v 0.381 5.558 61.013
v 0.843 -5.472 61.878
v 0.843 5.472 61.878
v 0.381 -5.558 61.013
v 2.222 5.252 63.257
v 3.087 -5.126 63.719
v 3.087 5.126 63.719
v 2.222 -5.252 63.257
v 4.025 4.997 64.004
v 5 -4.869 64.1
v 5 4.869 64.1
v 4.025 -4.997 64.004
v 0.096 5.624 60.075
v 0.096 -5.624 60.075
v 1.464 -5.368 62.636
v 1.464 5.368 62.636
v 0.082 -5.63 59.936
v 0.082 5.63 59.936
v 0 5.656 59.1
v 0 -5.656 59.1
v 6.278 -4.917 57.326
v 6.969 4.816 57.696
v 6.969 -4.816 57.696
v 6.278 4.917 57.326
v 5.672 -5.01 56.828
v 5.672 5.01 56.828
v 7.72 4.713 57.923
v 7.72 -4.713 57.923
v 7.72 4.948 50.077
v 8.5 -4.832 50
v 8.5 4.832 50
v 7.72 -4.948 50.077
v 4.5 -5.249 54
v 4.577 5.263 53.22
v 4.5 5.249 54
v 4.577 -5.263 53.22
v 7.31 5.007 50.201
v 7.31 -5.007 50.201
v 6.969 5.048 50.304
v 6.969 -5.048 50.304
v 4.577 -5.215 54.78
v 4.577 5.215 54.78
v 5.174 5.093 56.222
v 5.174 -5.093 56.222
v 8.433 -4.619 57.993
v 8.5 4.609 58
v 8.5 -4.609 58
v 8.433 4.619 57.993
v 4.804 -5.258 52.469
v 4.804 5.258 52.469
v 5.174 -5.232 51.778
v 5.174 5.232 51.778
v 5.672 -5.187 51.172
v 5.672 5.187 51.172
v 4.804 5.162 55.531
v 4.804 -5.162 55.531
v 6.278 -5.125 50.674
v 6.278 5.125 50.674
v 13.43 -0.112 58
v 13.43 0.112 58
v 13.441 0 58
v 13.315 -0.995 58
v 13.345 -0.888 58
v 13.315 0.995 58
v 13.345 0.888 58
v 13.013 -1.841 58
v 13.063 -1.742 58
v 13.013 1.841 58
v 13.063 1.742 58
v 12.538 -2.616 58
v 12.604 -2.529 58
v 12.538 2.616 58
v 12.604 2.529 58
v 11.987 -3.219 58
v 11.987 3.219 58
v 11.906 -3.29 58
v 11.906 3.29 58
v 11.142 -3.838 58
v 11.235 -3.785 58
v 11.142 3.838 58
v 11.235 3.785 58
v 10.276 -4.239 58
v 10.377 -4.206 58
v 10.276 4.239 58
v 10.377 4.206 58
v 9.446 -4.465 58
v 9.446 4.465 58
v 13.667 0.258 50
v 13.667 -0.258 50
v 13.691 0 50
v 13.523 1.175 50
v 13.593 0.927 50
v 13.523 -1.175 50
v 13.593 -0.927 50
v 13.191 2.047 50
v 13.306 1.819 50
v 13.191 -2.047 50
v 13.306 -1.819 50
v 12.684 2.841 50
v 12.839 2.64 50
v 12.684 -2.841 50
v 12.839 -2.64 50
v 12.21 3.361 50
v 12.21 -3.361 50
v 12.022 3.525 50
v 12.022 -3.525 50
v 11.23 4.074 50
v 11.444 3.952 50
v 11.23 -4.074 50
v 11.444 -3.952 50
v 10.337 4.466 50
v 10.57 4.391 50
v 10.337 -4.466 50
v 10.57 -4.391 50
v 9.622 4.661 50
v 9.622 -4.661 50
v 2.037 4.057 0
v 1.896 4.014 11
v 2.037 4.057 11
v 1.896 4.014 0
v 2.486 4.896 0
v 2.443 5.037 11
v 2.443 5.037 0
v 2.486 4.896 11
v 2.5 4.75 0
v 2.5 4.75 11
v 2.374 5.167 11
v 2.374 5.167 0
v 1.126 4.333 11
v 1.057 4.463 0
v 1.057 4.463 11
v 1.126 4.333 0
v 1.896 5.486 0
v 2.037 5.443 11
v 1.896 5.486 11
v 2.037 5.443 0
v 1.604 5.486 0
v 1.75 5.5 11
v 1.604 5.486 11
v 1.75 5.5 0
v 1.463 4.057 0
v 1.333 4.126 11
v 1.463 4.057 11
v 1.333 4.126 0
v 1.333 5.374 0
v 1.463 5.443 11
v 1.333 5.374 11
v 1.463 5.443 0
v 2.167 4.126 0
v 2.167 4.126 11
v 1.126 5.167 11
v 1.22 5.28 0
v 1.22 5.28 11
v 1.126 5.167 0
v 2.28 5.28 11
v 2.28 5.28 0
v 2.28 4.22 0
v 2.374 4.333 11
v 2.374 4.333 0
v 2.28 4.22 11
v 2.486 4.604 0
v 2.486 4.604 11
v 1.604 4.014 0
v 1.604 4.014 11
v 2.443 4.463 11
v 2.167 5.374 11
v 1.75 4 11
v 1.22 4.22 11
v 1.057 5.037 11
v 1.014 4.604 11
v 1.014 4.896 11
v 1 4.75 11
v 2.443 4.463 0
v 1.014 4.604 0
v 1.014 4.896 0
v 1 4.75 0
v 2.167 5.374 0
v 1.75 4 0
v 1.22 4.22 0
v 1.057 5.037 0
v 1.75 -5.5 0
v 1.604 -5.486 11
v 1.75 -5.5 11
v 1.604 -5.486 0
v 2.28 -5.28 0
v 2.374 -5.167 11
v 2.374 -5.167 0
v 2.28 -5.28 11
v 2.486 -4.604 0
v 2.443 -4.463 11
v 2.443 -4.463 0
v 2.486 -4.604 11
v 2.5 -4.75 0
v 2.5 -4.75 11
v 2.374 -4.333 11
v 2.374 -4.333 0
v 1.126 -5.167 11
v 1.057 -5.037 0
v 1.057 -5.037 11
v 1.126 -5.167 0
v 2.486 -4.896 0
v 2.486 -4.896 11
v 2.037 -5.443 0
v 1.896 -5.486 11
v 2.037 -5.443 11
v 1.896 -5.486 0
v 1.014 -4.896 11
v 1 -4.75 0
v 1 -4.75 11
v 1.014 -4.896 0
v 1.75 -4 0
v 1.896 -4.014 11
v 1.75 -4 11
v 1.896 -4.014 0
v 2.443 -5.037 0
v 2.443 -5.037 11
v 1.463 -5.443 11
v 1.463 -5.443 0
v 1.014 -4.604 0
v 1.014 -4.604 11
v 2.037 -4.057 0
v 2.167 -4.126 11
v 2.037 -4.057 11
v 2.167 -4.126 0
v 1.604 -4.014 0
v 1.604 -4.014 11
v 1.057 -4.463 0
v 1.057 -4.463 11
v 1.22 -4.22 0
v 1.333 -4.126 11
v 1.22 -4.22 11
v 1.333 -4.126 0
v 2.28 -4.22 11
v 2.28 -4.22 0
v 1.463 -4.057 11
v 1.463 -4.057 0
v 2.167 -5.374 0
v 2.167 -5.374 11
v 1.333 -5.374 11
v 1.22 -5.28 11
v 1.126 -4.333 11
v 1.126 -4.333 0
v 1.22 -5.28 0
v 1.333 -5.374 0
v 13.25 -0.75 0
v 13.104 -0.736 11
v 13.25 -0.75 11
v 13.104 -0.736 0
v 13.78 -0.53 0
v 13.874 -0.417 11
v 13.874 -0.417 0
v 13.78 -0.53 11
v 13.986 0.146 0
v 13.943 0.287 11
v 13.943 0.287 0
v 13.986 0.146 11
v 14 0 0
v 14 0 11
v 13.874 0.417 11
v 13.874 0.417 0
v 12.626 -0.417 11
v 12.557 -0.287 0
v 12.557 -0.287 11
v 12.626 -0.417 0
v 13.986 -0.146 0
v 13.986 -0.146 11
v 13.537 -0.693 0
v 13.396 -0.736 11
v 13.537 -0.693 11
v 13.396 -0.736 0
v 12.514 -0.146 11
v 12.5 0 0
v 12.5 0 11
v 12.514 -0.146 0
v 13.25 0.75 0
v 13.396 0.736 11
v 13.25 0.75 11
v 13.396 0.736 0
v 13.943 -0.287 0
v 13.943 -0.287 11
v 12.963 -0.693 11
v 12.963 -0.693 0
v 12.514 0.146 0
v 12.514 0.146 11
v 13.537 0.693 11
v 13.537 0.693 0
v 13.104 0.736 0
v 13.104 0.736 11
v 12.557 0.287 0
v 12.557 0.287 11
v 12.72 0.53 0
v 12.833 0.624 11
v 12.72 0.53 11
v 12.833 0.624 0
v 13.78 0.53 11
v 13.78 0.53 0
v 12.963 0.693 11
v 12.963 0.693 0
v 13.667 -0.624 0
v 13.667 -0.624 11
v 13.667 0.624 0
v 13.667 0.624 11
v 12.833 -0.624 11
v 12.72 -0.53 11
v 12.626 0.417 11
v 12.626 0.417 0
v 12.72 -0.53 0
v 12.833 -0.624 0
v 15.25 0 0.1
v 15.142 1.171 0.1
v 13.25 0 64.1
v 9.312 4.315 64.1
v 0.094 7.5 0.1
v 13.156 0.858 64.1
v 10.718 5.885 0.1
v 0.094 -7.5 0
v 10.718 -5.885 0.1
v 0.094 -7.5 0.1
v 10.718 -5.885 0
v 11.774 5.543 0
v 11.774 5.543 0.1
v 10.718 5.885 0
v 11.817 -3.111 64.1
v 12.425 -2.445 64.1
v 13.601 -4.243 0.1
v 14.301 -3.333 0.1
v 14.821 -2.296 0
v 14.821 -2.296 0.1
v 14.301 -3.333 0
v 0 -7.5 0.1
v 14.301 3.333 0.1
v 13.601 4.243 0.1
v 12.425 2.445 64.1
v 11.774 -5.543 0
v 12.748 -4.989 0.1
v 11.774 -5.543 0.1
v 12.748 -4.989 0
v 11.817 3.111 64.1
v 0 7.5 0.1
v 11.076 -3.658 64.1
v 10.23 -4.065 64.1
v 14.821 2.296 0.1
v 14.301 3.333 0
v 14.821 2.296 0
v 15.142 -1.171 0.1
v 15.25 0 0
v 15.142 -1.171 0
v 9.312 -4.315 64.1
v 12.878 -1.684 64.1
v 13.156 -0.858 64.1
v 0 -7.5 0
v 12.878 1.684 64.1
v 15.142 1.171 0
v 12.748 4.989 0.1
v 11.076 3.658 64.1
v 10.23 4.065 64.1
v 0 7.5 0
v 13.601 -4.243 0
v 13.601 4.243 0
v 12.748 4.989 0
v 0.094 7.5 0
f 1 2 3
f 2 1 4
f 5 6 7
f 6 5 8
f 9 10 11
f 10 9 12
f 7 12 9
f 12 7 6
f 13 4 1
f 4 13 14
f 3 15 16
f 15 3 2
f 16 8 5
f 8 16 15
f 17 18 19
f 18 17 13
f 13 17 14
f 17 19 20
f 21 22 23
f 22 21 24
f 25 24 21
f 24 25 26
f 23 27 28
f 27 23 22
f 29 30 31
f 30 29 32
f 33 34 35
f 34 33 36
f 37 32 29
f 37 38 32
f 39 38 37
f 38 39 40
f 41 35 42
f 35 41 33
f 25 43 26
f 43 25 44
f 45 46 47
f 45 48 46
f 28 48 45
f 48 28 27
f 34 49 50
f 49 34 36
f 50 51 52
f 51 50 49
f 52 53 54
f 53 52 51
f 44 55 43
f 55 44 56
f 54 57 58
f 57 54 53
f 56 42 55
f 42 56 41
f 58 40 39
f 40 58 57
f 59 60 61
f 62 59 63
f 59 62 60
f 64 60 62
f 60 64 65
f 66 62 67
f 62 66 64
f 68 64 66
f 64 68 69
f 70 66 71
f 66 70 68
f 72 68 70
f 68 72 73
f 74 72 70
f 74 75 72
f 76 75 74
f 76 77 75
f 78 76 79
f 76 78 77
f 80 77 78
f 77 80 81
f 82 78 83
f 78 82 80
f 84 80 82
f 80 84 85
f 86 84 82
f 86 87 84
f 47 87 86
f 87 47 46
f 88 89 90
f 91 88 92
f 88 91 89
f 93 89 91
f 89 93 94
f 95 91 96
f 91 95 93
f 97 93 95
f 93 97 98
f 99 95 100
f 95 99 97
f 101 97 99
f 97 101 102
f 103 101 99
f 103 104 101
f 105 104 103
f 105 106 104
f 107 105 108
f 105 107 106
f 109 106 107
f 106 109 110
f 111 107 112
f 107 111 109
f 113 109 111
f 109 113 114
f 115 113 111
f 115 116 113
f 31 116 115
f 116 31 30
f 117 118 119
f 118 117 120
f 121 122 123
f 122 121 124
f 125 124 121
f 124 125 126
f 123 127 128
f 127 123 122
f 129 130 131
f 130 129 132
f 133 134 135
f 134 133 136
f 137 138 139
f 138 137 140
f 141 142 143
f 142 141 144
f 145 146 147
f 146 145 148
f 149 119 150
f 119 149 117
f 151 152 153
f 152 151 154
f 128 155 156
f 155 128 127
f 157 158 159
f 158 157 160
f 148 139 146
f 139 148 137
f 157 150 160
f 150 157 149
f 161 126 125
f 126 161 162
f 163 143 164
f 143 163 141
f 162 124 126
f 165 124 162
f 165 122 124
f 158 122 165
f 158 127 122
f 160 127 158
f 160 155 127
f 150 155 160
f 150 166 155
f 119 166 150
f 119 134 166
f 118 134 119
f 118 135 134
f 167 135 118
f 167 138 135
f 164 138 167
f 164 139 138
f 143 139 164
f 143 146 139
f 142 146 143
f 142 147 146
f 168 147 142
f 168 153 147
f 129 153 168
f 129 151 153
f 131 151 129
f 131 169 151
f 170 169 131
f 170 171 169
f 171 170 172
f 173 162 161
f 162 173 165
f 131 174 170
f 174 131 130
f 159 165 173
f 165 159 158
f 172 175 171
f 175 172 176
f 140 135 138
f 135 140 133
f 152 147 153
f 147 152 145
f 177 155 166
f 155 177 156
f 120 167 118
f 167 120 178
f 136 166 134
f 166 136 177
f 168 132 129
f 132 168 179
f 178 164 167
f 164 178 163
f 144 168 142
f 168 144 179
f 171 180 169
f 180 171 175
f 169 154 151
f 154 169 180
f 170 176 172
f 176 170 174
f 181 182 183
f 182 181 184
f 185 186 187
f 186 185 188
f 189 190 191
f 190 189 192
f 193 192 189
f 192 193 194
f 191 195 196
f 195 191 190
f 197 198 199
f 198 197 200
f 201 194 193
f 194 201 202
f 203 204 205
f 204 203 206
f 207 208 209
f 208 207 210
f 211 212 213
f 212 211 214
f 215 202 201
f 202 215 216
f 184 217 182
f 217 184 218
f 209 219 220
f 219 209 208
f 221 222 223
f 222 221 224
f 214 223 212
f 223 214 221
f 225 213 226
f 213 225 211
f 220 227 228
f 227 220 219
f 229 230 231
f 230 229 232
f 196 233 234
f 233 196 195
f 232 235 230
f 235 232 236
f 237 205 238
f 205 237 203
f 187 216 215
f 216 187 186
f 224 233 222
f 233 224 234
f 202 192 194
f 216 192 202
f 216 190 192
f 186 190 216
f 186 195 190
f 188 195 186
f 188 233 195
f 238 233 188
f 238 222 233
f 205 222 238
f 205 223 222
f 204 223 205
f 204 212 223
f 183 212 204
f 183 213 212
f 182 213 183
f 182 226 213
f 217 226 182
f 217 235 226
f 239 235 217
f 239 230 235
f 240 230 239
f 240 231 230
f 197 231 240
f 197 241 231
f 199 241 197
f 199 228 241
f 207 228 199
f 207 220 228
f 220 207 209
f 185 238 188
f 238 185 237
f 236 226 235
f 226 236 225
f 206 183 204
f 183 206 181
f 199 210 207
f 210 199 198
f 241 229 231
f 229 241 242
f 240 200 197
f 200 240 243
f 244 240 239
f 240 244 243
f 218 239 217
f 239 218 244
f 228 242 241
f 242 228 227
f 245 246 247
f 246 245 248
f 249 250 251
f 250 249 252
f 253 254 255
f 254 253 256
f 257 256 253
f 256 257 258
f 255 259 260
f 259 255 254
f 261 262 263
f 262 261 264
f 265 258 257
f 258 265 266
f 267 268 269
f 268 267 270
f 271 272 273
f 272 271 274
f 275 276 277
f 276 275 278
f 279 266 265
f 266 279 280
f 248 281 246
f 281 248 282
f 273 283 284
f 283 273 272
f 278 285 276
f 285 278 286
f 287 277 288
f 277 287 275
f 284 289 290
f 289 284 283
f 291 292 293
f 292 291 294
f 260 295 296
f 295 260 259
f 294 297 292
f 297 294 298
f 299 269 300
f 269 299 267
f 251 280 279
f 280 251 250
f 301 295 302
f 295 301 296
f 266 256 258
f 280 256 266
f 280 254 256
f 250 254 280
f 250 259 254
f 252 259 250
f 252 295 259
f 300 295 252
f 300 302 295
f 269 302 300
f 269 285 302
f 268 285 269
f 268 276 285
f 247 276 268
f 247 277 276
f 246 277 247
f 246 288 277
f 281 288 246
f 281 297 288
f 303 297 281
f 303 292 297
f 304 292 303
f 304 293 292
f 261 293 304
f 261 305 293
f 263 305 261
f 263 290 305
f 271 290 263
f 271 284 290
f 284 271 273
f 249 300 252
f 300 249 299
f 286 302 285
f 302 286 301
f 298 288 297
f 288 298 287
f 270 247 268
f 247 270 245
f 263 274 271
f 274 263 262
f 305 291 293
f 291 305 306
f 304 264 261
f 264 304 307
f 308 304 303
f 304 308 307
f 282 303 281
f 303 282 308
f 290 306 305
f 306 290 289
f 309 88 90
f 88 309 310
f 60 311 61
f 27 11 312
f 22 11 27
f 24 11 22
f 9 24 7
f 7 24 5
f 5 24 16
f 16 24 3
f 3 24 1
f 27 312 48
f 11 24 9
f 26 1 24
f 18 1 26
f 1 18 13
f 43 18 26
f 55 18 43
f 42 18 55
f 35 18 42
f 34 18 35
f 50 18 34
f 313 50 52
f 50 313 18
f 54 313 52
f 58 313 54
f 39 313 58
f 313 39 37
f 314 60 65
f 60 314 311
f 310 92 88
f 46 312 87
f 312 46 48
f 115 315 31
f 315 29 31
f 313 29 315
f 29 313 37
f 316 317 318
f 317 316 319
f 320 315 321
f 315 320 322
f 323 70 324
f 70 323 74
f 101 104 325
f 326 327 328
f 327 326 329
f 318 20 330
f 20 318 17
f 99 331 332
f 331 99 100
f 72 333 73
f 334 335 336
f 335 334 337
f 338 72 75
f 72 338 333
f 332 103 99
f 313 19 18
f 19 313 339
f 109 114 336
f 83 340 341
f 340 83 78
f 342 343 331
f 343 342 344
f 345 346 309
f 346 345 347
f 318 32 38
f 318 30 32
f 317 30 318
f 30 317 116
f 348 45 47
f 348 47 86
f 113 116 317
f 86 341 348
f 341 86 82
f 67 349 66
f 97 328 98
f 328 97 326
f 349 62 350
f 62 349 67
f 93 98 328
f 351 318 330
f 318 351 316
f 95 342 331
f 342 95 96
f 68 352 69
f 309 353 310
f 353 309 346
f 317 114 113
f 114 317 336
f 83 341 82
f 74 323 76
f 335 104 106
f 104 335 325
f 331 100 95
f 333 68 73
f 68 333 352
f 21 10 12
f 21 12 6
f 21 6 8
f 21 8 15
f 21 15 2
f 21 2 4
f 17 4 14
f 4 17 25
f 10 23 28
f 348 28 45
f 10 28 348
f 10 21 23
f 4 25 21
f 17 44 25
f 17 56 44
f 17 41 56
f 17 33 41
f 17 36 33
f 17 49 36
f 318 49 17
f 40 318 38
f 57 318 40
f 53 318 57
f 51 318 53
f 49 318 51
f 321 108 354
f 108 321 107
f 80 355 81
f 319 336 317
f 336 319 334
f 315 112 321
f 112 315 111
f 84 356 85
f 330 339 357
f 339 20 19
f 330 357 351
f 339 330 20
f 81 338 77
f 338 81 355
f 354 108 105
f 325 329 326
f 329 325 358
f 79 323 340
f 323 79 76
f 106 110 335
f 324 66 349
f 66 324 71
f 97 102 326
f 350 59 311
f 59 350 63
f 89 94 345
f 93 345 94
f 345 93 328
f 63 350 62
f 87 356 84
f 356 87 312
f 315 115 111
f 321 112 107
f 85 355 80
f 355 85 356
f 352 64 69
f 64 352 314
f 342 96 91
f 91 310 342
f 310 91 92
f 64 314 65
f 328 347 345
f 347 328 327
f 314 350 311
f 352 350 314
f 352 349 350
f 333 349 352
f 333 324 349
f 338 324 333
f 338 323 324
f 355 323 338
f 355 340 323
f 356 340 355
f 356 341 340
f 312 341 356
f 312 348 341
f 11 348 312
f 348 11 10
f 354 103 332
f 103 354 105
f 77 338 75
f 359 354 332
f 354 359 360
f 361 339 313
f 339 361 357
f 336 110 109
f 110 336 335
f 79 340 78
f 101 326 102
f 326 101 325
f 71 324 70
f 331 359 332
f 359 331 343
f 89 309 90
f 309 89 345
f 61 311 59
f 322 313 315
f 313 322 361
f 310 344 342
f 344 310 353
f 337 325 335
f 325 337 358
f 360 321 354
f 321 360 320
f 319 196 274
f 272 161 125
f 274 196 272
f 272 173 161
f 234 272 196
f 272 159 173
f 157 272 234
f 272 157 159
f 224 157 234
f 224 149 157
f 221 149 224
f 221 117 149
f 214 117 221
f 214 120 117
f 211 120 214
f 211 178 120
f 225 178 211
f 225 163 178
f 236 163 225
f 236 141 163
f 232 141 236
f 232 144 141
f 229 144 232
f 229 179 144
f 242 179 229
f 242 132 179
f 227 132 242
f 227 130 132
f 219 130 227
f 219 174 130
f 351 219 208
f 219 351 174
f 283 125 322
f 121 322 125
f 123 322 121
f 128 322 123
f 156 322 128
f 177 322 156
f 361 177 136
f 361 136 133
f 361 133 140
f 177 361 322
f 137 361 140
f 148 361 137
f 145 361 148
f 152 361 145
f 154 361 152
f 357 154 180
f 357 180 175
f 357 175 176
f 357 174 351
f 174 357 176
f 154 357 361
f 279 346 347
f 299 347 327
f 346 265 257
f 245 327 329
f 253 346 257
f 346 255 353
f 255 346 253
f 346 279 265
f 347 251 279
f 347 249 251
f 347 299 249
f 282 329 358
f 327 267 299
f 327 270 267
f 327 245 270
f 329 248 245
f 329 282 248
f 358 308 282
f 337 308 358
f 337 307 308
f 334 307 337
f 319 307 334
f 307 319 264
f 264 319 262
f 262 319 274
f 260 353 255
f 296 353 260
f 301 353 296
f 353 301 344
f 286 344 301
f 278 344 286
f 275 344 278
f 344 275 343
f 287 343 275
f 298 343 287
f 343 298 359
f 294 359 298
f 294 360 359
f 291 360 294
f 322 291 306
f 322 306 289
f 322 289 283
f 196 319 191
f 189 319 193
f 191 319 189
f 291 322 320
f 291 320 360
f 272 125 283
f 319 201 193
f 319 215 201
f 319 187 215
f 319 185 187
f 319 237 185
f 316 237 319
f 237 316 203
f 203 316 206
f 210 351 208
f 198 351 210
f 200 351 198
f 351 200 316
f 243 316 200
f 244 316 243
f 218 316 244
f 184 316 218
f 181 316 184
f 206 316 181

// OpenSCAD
CIRCLE_SEGMENTS = 32;
BASE_X = 15.25;
BASE_Y = 15;
SCREW_DIAMETER = 1.5;
SCREW_LENGTH = 12;

module rounded_triangle(x, y) {
  resize([x, y, 0])
    linear_extrude(0.1, true) {
      difference() {
        hull() {
          translate([10.25, 0, 0])
            circle(r=6, $fn=CIRCLE_SEGMENTS);

          translate([0, -7.5, 0])
            square([0.1, 15]);
        }

        translate([-5, -7.5, 0])
          square([5, 15]);
      }
    }
  }

module inside_rounded_corner(length, radius=1) {
  padded = radius + 0.5;

  rotate([-90, 0, 0])
    difference() {
      cube([padded, padded, length]);

      translate([padded, padded, -1])
        cylinder(r=radius, h=length+2, $fn=CIRCLE_SEGMENTS);
    }
}

module tone_arm_cutout() {
  rotate([90, 0, 0])
    cylinder(r=4, h=15, $fn=CIRCLE_SEGMENTS);

  translate([0, -15, -4])
    cube([8, 15, 8]);
}

module screw_holes() {
  translate([1.75, 4.75, -1])
    cylinder(d=SCREW_DIAMETER, h=SCREW_LENGTH, $fn=CIRCLE_SEGMENTS);

  translate([1.75, -4.75, -1])
    cylinder(d=SCREW_DIAMETER, h=SCREW_LENGTH, $fn=CIRCLE_SEGMENTS);

  translate([13.25, 0, -1])
    cylinder(d=SCREW_DIAMETER, h=SCREW_LENGTH, $fn=CIRCLE_SEGMENTS);
}

module obelisk(wall_thickness, top) {
  hull() {
    rounded_triangle(BASE_X, BASE_Y);

    translate([0, 0, top])
      rounded_triangle(BASE_X - 2, BASE_Y - 4);
  }
}

module stand(cutout_bottom) {
  top = cutout_bottom + 4 + 10;

  difference() {
    obelisk(1.5, top);

    translate([-0.5, -6.5, top+0.6])
      inside_rounded_corner(13, 5);

    translate([8.5, 7.5, cutout_bottom+4])
      tone_arm_cutout();

    screw_holes();
  }
}

stand(50);
